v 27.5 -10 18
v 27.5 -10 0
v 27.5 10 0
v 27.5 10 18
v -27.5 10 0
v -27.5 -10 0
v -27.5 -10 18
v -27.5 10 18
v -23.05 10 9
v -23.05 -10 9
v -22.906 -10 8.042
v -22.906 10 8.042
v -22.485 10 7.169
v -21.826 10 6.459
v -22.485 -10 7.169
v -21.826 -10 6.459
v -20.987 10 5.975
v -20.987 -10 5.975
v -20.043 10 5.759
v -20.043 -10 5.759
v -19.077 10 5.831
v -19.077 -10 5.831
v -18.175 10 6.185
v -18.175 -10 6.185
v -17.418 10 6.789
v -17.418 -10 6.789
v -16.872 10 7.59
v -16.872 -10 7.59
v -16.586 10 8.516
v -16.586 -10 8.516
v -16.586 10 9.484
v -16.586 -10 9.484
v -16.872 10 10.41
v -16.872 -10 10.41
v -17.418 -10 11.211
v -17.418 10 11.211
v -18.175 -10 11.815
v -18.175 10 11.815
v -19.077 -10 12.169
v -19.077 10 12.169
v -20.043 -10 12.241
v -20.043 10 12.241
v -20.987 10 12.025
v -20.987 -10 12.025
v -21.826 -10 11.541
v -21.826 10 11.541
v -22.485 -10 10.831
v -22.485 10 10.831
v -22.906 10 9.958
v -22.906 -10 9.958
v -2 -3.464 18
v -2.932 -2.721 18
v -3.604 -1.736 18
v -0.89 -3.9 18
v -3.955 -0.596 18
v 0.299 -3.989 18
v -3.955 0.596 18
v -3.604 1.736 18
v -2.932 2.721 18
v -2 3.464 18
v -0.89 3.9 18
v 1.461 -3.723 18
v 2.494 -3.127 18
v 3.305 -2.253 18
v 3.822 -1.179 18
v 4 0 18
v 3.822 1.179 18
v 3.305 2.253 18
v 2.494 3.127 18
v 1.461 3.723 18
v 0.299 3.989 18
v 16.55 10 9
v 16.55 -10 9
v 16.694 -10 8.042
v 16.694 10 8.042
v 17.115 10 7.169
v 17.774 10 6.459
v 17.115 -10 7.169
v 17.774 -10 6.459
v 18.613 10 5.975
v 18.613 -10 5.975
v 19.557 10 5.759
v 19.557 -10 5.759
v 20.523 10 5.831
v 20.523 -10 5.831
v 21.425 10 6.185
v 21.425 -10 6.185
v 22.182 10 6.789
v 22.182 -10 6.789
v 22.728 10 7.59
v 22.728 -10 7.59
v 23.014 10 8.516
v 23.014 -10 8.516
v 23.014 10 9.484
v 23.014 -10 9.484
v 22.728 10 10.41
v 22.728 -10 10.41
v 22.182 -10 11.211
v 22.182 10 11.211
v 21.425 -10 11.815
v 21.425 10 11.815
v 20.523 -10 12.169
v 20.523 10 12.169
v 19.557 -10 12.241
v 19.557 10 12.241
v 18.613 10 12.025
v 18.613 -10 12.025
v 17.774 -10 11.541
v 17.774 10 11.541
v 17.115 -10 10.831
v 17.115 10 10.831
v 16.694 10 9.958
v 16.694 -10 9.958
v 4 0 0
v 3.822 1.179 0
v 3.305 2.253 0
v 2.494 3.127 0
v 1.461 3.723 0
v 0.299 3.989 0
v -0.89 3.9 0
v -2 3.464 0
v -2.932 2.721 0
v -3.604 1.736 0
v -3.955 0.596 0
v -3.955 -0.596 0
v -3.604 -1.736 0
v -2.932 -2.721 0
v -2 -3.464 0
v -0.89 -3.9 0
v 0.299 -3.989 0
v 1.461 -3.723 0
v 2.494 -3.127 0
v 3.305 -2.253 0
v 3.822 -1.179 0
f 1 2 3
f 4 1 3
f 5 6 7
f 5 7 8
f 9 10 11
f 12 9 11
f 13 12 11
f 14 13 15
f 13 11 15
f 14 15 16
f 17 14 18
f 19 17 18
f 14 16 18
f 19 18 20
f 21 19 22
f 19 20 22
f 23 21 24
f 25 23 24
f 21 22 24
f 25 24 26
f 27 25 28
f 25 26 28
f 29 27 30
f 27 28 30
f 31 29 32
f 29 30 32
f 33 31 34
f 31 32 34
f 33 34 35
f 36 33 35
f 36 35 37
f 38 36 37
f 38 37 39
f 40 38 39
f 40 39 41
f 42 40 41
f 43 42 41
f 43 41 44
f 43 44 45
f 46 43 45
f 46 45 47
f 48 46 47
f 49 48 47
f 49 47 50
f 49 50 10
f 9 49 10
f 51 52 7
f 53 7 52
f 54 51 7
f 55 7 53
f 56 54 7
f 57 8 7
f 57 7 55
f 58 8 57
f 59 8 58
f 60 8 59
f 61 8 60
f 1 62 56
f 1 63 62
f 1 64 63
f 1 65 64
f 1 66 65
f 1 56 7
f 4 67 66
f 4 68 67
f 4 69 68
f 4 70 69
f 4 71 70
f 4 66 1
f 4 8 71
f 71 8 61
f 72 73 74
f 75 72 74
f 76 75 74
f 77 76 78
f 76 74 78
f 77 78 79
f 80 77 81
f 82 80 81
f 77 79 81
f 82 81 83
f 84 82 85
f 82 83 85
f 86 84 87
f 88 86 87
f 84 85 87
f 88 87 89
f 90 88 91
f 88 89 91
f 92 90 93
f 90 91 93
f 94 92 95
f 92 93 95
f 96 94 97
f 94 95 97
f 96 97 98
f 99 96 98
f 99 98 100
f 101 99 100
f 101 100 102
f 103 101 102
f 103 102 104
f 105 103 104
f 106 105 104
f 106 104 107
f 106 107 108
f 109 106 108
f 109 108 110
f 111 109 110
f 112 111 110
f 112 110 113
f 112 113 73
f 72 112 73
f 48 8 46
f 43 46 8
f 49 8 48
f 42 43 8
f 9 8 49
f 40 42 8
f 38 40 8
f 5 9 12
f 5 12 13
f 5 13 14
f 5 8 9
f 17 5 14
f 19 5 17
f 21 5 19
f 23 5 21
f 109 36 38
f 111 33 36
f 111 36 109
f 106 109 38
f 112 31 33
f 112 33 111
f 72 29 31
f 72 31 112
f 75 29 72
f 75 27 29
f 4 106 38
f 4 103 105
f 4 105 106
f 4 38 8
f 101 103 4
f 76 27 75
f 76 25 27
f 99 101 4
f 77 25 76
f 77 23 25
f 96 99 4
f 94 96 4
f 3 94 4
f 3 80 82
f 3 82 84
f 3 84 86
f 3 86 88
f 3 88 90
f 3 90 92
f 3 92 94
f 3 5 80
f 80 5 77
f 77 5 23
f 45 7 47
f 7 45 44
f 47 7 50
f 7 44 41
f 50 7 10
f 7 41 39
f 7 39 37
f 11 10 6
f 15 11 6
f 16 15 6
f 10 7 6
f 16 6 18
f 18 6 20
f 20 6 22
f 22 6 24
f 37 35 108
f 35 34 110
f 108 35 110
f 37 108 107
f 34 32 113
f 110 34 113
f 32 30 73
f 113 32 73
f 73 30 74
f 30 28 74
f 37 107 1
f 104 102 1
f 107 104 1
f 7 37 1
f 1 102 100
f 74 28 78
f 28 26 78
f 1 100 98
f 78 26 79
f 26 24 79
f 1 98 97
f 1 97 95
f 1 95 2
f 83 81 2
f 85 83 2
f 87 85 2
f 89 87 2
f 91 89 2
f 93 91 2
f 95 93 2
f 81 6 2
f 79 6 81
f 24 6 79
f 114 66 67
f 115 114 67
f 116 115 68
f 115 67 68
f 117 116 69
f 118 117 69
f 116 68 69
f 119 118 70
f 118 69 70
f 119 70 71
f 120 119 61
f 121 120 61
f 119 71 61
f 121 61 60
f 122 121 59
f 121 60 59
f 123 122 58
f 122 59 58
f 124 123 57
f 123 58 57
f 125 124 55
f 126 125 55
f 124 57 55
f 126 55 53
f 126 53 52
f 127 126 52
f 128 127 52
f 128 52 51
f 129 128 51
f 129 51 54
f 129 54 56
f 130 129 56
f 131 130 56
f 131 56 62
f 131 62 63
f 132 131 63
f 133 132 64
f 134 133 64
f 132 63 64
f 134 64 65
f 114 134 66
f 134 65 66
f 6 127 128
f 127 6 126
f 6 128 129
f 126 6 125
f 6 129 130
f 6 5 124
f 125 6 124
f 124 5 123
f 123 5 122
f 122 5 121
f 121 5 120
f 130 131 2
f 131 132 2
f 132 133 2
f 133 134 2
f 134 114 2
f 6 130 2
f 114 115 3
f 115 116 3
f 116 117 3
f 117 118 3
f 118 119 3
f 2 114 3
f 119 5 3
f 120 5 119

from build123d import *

# Parameters (mm, degrees)
SKETCH_1_W              = 55
SKETCH_1_H              = 20
EXTRUDE_1_DEPTH         = 18
SKETCH_2_R              = 4
CUT_EXTRUDE_1_DEPTH     = 18
HOLE_WIZARD_6_5_6_5_1_D = 6.5


with BuildPart() as part:
    # Эскиз1 → Бобышка-Вытянуть1 (new body)
    with BuildSketch(Plane.XY):
        Rectangle(SKETCH_1_W, SKETCH_1_H)
    extrude(amount=EXTRUDE_1_DEPTH)

    # Эскиз2 → Вырез-Вытянуть1 (cut)
    with BuildSketch(Plane.XY.offset(18)):
        Circle(SKETCH_2_R)
    extrude(amount=-CUT_EXTRUDE_1_DEPTH, mode=Mode.SUBTRACT)

    # Диаметр отверстия Ø6.5 (6.5)1 (through all)
    with Locations(Plane(origin=(0, 10, 0), x_dir=(1, 0, 0), z_dir=(0, 1, 0))):
        with Locations((19.8, -9), (-19.8, -9)):
            Hole(HOLE_WIZARD_6_5_6_5_1_D / 2)


solid = part.part
